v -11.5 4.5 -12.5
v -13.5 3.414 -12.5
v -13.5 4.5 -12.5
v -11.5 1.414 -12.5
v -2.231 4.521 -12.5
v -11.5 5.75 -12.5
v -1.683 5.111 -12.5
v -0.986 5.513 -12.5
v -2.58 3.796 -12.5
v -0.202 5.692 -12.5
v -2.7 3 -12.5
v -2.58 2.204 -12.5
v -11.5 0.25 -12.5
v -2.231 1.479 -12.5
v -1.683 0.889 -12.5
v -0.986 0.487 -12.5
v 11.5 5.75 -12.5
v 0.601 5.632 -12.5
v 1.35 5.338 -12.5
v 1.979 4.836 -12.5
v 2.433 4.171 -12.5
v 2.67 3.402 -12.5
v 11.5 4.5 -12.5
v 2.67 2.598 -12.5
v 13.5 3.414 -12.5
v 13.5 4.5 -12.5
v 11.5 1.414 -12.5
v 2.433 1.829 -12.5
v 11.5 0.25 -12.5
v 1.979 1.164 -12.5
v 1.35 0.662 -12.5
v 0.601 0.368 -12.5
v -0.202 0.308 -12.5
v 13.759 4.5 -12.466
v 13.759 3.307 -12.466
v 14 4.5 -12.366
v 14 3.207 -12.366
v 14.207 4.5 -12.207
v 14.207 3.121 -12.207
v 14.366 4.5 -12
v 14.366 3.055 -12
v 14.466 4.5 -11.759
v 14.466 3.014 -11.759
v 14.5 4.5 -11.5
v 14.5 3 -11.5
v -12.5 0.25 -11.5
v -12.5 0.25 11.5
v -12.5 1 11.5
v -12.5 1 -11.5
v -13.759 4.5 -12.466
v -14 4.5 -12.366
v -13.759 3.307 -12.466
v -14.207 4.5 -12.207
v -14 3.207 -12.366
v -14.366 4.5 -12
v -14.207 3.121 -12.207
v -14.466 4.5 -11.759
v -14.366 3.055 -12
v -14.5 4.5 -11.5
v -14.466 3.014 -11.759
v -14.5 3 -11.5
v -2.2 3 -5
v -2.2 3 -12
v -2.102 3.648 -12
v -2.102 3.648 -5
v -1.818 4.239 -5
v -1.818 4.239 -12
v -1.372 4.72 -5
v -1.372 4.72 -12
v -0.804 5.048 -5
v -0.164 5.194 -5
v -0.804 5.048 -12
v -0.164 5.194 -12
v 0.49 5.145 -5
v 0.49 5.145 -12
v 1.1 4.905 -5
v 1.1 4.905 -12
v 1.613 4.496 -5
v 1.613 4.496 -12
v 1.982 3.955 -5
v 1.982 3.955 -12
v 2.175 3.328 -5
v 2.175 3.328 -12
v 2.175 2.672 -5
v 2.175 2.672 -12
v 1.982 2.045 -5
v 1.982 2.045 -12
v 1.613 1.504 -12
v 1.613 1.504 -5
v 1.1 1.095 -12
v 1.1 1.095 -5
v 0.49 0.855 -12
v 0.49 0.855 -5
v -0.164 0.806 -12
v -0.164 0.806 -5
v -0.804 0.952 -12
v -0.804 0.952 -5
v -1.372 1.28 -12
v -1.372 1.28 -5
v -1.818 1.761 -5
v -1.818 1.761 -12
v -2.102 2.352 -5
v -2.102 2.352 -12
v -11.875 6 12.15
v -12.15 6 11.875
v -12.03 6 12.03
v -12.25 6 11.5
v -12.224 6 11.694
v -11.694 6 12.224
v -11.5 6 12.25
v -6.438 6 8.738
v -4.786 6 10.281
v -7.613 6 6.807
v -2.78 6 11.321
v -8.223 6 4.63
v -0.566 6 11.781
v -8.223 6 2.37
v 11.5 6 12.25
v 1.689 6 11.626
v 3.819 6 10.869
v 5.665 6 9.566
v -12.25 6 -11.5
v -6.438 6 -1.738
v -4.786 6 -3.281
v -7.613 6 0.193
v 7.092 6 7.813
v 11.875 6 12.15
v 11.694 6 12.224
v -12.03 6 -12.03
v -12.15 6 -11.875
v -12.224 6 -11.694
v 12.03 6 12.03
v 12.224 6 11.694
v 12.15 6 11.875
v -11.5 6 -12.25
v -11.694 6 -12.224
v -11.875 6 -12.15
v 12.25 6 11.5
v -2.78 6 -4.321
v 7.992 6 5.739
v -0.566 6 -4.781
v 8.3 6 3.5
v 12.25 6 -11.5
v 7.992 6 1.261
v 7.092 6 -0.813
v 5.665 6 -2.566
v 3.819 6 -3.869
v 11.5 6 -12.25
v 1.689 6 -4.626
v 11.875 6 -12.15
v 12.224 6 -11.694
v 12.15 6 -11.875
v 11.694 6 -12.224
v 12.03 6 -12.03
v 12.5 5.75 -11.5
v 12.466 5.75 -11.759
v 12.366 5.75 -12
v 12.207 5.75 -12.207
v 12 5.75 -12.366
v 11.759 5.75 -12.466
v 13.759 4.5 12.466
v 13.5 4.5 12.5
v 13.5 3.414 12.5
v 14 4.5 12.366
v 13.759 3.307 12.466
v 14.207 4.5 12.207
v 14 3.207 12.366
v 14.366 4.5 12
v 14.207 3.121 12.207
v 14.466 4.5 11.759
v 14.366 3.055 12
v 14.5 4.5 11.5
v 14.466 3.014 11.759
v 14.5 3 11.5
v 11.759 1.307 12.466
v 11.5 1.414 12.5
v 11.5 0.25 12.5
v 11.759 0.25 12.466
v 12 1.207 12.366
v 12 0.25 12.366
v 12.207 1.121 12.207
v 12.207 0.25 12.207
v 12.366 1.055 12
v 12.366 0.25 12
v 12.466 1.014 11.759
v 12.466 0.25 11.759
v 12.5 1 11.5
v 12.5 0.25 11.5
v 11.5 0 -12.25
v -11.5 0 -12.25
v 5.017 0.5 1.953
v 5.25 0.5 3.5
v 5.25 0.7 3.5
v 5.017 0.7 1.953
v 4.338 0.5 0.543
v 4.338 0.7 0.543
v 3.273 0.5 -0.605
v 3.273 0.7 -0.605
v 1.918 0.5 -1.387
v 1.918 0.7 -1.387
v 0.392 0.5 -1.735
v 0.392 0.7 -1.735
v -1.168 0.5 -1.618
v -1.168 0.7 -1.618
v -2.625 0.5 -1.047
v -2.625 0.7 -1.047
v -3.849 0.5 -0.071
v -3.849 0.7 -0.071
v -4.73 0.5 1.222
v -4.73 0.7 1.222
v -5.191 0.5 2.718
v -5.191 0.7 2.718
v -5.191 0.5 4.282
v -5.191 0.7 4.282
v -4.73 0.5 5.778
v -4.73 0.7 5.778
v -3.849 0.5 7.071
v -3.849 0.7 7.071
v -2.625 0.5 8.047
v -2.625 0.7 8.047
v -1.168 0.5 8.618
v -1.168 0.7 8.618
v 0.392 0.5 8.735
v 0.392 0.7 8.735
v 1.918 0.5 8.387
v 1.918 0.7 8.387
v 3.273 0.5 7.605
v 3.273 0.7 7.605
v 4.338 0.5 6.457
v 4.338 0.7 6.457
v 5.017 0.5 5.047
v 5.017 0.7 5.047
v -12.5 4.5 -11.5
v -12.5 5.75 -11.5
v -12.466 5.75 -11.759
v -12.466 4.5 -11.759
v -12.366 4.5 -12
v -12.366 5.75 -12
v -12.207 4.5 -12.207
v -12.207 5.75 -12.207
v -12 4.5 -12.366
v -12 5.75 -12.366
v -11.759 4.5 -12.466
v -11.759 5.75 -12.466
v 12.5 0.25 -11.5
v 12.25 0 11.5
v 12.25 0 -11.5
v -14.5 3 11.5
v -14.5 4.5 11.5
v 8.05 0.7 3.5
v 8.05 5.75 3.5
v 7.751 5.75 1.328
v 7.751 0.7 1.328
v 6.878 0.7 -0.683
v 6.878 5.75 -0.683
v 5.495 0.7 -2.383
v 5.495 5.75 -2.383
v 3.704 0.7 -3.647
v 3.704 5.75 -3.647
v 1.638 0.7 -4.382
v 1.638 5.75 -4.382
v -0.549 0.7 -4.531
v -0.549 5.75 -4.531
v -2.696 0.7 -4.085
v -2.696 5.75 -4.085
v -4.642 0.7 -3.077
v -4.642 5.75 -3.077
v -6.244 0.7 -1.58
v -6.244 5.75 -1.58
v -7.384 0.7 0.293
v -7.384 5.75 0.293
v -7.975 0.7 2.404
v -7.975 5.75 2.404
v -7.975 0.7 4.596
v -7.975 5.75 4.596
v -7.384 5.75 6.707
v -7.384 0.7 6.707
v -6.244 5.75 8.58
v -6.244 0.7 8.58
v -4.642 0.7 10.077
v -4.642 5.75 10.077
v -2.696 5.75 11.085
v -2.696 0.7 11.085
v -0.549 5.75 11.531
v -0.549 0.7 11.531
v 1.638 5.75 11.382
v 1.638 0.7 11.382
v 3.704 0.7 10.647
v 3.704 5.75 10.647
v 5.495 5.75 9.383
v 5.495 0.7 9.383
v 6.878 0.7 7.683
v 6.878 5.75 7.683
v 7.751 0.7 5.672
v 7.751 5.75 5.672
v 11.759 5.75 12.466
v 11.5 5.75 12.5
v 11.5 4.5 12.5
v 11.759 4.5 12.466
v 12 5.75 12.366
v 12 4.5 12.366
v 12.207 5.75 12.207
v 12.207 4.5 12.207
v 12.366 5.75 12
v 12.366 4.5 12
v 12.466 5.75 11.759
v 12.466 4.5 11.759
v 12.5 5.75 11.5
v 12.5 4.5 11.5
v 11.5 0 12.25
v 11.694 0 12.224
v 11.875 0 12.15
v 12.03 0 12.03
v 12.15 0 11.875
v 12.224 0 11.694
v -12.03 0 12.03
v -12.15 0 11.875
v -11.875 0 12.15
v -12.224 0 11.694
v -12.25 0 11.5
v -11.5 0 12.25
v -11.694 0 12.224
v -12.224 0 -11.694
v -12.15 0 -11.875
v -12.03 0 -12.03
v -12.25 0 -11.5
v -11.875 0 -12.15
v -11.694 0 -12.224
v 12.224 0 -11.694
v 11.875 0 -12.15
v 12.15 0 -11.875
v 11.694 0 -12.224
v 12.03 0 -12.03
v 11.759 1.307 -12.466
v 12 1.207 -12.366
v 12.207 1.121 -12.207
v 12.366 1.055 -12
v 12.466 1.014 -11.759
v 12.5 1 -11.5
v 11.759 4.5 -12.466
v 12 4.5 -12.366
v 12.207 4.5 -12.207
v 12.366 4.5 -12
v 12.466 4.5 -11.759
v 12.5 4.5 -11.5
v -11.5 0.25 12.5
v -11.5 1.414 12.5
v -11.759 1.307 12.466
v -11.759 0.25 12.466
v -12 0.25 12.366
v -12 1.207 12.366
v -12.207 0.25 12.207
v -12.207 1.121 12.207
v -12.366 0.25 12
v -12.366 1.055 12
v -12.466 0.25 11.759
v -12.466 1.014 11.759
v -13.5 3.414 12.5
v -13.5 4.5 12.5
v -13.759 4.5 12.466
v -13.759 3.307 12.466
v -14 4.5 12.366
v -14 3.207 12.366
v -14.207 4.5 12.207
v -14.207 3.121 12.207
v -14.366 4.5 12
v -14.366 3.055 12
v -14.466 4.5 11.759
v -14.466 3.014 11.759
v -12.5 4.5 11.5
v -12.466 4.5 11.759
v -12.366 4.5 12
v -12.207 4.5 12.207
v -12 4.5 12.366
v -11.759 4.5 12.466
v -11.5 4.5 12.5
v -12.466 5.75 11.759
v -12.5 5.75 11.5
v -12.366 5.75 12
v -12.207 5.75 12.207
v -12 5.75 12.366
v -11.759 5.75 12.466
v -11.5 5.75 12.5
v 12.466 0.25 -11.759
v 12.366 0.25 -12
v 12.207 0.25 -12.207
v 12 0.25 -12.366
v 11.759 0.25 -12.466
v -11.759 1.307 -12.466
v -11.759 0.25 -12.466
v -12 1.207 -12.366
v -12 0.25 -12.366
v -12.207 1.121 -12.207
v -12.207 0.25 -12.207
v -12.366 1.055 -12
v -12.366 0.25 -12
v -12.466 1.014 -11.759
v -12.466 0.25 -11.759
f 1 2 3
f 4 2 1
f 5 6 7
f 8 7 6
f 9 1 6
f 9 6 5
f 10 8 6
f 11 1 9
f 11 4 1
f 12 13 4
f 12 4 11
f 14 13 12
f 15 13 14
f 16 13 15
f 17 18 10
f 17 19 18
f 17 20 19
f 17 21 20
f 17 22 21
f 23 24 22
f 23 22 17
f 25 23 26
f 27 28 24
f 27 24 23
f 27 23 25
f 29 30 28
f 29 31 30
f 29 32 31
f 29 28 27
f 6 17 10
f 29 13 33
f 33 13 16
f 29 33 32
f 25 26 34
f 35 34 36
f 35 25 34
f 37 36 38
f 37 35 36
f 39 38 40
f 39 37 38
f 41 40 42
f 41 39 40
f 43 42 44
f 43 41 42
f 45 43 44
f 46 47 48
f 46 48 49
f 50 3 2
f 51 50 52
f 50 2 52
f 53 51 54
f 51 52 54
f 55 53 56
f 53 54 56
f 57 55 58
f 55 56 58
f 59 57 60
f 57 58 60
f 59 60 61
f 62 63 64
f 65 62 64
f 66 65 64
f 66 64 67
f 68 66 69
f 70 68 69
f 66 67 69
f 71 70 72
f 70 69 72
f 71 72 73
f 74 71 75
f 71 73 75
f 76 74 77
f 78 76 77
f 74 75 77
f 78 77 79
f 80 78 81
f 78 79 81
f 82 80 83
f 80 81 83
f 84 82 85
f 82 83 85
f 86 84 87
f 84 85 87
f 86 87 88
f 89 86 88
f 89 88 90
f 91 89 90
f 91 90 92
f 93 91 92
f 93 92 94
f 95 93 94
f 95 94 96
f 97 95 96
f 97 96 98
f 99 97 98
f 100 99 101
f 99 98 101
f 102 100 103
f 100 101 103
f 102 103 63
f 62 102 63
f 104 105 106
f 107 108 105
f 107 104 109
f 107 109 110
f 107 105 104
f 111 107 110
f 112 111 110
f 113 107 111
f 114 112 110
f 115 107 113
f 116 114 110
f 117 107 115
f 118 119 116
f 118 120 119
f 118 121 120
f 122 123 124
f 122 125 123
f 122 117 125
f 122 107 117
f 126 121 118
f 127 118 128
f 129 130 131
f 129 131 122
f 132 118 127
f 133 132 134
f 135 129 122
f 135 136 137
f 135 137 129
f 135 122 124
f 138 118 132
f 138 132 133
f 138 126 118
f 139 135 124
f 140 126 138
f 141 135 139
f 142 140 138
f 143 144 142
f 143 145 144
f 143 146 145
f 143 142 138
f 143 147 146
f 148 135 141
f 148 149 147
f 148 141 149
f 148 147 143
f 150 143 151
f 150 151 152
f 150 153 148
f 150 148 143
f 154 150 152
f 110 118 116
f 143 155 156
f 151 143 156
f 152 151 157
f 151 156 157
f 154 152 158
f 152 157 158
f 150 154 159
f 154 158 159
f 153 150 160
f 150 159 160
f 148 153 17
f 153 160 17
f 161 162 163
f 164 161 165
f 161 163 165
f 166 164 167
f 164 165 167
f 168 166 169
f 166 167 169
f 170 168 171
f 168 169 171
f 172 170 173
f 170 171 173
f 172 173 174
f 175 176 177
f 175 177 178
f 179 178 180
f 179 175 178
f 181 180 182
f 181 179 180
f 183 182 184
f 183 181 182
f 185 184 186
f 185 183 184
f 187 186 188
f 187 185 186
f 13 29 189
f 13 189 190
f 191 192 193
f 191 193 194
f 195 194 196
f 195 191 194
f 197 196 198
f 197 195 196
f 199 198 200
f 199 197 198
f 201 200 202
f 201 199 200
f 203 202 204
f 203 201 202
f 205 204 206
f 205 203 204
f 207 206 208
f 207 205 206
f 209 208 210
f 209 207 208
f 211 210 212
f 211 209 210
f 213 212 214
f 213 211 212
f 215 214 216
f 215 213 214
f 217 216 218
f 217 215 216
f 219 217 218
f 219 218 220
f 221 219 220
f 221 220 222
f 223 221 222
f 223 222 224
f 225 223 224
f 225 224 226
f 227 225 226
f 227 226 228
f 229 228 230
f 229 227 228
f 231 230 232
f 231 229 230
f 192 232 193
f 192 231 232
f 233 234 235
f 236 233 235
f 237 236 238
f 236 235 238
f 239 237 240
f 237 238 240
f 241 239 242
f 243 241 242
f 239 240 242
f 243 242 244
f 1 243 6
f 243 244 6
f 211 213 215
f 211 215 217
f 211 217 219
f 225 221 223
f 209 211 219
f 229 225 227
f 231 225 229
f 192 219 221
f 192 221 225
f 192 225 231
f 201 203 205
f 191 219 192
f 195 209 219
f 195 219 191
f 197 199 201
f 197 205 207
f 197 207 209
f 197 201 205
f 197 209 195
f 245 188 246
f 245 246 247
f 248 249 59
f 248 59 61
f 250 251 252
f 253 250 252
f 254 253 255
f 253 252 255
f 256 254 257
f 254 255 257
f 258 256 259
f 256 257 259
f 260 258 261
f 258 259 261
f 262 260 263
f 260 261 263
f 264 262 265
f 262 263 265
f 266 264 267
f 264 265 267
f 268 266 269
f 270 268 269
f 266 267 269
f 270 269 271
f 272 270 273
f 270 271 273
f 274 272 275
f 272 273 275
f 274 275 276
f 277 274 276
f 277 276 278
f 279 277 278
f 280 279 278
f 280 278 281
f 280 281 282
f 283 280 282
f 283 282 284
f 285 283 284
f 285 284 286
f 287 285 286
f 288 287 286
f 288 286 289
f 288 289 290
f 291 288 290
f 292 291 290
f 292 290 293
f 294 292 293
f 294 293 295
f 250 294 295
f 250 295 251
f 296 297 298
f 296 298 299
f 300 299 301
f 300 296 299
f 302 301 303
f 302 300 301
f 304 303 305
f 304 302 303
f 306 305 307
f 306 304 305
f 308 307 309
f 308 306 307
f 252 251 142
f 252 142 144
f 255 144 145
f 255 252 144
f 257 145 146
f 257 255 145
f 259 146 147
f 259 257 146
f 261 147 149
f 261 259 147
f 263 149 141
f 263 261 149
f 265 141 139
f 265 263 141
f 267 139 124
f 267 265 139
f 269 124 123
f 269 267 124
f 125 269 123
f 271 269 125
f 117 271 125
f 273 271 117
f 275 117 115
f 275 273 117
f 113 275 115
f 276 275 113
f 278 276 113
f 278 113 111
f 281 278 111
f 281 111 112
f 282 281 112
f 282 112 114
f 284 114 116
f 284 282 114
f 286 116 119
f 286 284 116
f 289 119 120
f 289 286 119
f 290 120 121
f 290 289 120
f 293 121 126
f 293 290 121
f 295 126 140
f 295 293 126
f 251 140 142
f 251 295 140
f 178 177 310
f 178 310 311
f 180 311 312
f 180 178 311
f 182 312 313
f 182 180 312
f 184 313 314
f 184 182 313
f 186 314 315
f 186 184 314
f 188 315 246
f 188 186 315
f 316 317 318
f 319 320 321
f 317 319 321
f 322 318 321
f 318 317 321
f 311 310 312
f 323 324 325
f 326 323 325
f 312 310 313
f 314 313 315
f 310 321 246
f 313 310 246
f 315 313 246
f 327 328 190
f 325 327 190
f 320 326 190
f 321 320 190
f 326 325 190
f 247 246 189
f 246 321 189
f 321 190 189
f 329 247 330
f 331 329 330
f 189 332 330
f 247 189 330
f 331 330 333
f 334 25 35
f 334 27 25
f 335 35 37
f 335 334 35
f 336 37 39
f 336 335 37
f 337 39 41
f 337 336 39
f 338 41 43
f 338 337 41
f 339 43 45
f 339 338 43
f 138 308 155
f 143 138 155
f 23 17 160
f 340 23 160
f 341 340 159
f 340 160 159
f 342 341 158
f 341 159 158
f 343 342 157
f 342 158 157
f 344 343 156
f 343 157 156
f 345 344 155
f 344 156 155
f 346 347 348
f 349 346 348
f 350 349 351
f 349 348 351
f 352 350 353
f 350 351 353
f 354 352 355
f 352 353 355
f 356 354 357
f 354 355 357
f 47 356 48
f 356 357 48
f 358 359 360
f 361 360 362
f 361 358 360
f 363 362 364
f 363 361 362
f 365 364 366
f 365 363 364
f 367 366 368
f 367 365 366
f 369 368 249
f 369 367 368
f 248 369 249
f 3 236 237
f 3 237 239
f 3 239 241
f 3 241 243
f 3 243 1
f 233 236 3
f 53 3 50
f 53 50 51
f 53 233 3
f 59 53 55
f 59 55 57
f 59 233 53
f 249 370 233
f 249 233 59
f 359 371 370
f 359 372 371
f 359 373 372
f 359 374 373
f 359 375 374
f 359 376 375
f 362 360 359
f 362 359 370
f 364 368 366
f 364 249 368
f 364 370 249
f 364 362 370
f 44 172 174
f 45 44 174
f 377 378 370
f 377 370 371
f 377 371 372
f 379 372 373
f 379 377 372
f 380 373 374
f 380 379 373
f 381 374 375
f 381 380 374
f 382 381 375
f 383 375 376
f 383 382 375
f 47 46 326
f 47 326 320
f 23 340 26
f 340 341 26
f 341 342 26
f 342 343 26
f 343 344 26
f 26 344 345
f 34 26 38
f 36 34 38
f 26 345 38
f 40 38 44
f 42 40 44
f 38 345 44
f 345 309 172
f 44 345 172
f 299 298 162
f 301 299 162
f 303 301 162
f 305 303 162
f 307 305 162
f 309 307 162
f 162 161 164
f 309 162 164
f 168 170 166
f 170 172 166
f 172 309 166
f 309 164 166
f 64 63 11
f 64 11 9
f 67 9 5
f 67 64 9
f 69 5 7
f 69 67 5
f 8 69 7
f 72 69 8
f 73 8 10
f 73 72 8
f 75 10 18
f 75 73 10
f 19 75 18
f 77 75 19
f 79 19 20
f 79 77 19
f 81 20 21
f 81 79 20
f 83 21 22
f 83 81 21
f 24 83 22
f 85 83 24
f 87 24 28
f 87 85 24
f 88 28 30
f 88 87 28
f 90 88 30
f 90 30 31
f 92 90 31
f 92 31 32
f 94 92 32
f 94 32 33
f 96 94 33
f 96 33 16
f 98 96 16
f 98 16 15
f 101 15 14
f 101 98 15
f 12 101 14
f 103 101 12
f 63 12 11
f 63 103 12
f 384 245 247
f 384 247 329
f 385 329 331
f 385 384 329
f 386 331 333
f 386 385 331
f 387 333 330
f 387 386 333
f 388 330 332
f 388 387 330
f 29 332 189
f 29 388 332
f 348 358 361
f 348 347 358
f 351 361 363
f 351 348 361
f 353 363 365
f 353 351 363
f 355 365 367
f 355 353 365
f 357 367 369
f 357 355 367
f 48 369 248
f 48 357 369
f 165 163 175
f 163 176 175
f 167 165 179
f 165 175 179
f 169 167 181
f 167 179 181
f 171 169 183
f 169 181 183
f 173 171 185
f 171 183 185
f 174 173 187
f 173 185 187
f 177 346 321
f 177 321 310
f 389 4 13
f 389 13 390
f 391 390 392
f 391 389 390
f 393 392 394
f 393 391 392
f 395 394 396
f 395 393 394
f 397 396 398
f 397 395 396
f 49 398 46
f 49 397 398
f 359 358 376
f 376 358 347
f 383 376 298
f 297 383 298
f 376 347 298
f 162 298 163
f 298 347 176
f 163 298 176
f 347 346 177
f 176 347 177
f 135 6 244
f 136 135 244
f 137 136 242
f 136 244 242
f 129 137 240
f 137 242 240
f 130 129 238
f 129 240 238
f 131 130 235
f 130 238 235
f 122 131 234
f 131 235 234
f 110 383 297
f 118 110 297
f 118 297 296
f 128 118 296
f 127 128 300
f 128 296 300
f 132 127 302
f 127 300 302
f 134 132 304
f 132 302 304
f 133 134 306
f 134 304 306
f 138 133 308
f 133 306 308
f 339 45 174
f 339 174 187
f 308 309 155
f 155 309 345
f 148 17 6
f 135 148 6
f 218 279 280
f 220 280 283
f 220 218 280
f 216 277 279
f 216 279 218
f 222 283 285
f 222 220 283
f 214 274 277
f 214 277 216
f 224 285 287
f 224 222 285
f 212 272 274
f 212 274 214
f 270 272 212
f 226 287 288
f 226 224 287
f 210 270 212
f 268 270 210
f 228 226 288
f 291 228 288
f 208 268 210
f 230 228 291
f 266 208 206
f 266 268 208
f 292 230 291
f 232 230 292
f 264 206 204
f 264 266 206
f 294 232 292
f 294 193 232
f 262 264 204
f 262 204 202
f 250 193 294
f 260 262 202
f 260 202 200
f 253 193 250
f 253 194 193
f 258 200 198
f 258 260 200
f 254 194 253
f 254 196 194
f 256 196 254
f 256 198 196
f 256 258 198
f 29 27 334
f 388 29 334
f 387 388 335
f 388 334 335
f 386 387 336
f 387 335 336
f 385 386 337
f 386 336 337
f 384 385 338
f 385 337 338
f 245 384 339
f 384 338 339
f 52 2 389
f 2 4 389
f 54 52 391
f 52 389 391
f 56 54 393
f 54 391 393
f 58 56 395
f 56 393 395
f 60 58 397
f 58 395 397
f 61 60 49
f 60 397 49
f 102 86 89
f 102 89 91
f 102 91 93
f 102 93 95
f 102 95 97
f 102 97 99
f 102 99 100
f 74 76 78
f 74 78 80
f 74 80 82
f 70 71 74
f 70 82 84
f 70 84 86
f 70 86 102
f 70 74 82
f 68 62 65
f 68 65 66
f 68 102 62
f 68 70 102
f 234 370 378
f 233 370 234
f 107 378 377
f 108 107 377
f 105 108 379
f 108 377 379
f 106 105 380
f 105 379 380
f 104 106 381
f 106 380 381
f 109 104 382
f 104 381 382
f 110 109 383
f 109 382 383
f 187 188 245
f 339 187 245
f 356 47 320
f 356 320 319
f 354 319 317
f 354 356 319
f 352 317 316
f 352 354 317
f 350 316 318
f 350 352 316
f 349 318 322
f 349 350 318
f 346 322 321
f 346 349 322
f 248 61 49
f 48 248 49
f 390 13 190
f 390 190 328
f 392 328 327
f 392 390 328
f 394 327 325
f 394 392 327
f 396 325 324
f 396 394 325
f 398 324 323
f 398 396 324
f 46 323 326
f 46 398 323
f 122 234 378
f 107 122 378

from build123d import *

# Parameters (mm, degrees)
SKETCH1_W           = 25
SKETCH1_H           = 25
BOSS_EXTRUDE1_DEPTH = 6
SKETCH2_R           = 8.05
CUT_EXTRUDE1_DEPTH  = 5.5
BOSS_EXTRUDE2_DEPTH = 25
SKETCH5_R           = 2.2
CUT_EXTRUDE3_DEPTH  = 7.5
SKETCH6_R           = 8.05
SKETCH6_R_2         = 5.25
BOSS_EXTRUDE3_DEPTH = 0.2
FILLET1_R           = 1
CHAMFER1_SIZE       = 0.5
CHAMFER2_SIZE       = 0.25


with BuildPart() as part:
    # Sketch1 → Boss-Extrude1 (new body)
    with BuildSketch(Plane(origin=(0, 0, 0), x_dir=(1, 0, 0), z_dir=(0, 1, 0))):
        Rectangle(SKETCH1_W, SKETCH1_H)
    extrude(amount=BOSS_EXTRUDE1_DEPTH)

    # Sketch2 → Cut-Extrude1 (cut)
    with BuildSketch(Plane(origin=(0, 6, 0), x_dir=(1, 0, 0), z_dir=(0, 1, 0))):
        with Locations((0, -3.5)):
            Circle(SKETCH2_R)
    extrude(amount=-CUT_EXTRUDE1_DEPTH, mode=Mode.SUBTRACT)

    # Sketch4 → Boss-Extrude2 (add)
    with BuildSketch(Plane.XY.offset(12.5)):
        Polygon((12.5, 4.5), (14.5, 4.5), (14.5, 3), (12.5, 1), align=None)
        Polygon((-12.5, 1), (-12.5, 4.5), (-14.5, 4.5), (-14.5, 3), align=None)
    extrude(amount=-BOSS_EXTRUDE2_DEPTH)

    # Sketch5 → Cut-Extrude3 (cut)
    with BuildSketch(Plane(origin=(0, 0, -12.5), x_dir=(-1, 0, 0), z_dir=(0, 0, -1))):
        with Locations((0, 3)):
            Circle(SKETCH5_R)
    extrude(amount=-CUT_EXTRUDE3_DEPTH, mode=Mode.SUBTRACT)

    # Sketch6 → Boss-Extrude3 (add)
    with BuildSketch(Plane(origin=(0, 0.5, 0), x_dir=(1, 0, 0), z_dir=(0, 1, 0))):
        with Locations((0, -3.5)):
            Circle(SKETCH6_R)
        with Locations((0, -3.5)):
            Circle(SKETCH6_R_2, mode=Mode.SUBTRACT)
    extrude(amount=BOSS_EXTRUDE3_DEPTH)

    # Fillet1
    fillet1_edges = [part.edges().sort_by_distance(p)[0] for p in [
        (12.5, 0.5, -12.5),
        (12.5, 0.5, 12.5),
        (13.5, 2, 12.5),
        (14.5, 3.75, 12.5),
        (14.5, 3.75, -12.5),
        (13.5, 2, -12.5),
        (-12.5, 0.5, 12.5),
        (-12.5, 0.5, -12.5),
        (-13.5, 2, 12.5),
        (-14.5, 3.75, 12.5),
        (-13.5, 2, -12.5),
        (-14.5, 3.75, -12.5),
        (12.5, 5.25, 12.5),
        (-12.5, 5.25, 12.5),
        (-12.5, 5.25, -12.5),
        (12.5, 5.25, -12.5),
    ]]
    fillet(fillet1_edges, radius=FILLET1_R)

    # Chamfer1
    chamfer1_edges = [part.edges().sort_by_distance(p)[0] for p in [
        (2.2, 3, -12.5),
    ]]
    chamfer(chamfer1_edges, length=CHAMFER1_SIZE)

    # Chamfer2
    chamfer2_edges = [part.edges().sort_by_distance(p)[0] for p in [
        (-8.05, 6, 3.5),
        (0, 0, 12.5),
        (0, 6, 12.5),
        (0, 0, -12.5),
        (0, 6, -12.5),
        (12.5, 0, 0),
        (-12.5, 0, 0),
        (12.207106781, 0, -12.207106781),
        (-12.207106781, 0, -12.207106781),
        (-12.207106781, 0, 12.207106781),
        (12.207106781, 0, 12.207106781),
        (12.5, 6, 0),
        (-12.5, 6, 0),
        (12.207106781, 6, -12.207106781),
        (-12.207106781, 6, -12.207106781),
        (-12.207106781, 6, 12.207106781),
        (12.207106781, 6, 12.207106781),
    ]]
    chamfer(chamfer2_edges, length=CHAMFER2_SIZE)


solid = part.part
